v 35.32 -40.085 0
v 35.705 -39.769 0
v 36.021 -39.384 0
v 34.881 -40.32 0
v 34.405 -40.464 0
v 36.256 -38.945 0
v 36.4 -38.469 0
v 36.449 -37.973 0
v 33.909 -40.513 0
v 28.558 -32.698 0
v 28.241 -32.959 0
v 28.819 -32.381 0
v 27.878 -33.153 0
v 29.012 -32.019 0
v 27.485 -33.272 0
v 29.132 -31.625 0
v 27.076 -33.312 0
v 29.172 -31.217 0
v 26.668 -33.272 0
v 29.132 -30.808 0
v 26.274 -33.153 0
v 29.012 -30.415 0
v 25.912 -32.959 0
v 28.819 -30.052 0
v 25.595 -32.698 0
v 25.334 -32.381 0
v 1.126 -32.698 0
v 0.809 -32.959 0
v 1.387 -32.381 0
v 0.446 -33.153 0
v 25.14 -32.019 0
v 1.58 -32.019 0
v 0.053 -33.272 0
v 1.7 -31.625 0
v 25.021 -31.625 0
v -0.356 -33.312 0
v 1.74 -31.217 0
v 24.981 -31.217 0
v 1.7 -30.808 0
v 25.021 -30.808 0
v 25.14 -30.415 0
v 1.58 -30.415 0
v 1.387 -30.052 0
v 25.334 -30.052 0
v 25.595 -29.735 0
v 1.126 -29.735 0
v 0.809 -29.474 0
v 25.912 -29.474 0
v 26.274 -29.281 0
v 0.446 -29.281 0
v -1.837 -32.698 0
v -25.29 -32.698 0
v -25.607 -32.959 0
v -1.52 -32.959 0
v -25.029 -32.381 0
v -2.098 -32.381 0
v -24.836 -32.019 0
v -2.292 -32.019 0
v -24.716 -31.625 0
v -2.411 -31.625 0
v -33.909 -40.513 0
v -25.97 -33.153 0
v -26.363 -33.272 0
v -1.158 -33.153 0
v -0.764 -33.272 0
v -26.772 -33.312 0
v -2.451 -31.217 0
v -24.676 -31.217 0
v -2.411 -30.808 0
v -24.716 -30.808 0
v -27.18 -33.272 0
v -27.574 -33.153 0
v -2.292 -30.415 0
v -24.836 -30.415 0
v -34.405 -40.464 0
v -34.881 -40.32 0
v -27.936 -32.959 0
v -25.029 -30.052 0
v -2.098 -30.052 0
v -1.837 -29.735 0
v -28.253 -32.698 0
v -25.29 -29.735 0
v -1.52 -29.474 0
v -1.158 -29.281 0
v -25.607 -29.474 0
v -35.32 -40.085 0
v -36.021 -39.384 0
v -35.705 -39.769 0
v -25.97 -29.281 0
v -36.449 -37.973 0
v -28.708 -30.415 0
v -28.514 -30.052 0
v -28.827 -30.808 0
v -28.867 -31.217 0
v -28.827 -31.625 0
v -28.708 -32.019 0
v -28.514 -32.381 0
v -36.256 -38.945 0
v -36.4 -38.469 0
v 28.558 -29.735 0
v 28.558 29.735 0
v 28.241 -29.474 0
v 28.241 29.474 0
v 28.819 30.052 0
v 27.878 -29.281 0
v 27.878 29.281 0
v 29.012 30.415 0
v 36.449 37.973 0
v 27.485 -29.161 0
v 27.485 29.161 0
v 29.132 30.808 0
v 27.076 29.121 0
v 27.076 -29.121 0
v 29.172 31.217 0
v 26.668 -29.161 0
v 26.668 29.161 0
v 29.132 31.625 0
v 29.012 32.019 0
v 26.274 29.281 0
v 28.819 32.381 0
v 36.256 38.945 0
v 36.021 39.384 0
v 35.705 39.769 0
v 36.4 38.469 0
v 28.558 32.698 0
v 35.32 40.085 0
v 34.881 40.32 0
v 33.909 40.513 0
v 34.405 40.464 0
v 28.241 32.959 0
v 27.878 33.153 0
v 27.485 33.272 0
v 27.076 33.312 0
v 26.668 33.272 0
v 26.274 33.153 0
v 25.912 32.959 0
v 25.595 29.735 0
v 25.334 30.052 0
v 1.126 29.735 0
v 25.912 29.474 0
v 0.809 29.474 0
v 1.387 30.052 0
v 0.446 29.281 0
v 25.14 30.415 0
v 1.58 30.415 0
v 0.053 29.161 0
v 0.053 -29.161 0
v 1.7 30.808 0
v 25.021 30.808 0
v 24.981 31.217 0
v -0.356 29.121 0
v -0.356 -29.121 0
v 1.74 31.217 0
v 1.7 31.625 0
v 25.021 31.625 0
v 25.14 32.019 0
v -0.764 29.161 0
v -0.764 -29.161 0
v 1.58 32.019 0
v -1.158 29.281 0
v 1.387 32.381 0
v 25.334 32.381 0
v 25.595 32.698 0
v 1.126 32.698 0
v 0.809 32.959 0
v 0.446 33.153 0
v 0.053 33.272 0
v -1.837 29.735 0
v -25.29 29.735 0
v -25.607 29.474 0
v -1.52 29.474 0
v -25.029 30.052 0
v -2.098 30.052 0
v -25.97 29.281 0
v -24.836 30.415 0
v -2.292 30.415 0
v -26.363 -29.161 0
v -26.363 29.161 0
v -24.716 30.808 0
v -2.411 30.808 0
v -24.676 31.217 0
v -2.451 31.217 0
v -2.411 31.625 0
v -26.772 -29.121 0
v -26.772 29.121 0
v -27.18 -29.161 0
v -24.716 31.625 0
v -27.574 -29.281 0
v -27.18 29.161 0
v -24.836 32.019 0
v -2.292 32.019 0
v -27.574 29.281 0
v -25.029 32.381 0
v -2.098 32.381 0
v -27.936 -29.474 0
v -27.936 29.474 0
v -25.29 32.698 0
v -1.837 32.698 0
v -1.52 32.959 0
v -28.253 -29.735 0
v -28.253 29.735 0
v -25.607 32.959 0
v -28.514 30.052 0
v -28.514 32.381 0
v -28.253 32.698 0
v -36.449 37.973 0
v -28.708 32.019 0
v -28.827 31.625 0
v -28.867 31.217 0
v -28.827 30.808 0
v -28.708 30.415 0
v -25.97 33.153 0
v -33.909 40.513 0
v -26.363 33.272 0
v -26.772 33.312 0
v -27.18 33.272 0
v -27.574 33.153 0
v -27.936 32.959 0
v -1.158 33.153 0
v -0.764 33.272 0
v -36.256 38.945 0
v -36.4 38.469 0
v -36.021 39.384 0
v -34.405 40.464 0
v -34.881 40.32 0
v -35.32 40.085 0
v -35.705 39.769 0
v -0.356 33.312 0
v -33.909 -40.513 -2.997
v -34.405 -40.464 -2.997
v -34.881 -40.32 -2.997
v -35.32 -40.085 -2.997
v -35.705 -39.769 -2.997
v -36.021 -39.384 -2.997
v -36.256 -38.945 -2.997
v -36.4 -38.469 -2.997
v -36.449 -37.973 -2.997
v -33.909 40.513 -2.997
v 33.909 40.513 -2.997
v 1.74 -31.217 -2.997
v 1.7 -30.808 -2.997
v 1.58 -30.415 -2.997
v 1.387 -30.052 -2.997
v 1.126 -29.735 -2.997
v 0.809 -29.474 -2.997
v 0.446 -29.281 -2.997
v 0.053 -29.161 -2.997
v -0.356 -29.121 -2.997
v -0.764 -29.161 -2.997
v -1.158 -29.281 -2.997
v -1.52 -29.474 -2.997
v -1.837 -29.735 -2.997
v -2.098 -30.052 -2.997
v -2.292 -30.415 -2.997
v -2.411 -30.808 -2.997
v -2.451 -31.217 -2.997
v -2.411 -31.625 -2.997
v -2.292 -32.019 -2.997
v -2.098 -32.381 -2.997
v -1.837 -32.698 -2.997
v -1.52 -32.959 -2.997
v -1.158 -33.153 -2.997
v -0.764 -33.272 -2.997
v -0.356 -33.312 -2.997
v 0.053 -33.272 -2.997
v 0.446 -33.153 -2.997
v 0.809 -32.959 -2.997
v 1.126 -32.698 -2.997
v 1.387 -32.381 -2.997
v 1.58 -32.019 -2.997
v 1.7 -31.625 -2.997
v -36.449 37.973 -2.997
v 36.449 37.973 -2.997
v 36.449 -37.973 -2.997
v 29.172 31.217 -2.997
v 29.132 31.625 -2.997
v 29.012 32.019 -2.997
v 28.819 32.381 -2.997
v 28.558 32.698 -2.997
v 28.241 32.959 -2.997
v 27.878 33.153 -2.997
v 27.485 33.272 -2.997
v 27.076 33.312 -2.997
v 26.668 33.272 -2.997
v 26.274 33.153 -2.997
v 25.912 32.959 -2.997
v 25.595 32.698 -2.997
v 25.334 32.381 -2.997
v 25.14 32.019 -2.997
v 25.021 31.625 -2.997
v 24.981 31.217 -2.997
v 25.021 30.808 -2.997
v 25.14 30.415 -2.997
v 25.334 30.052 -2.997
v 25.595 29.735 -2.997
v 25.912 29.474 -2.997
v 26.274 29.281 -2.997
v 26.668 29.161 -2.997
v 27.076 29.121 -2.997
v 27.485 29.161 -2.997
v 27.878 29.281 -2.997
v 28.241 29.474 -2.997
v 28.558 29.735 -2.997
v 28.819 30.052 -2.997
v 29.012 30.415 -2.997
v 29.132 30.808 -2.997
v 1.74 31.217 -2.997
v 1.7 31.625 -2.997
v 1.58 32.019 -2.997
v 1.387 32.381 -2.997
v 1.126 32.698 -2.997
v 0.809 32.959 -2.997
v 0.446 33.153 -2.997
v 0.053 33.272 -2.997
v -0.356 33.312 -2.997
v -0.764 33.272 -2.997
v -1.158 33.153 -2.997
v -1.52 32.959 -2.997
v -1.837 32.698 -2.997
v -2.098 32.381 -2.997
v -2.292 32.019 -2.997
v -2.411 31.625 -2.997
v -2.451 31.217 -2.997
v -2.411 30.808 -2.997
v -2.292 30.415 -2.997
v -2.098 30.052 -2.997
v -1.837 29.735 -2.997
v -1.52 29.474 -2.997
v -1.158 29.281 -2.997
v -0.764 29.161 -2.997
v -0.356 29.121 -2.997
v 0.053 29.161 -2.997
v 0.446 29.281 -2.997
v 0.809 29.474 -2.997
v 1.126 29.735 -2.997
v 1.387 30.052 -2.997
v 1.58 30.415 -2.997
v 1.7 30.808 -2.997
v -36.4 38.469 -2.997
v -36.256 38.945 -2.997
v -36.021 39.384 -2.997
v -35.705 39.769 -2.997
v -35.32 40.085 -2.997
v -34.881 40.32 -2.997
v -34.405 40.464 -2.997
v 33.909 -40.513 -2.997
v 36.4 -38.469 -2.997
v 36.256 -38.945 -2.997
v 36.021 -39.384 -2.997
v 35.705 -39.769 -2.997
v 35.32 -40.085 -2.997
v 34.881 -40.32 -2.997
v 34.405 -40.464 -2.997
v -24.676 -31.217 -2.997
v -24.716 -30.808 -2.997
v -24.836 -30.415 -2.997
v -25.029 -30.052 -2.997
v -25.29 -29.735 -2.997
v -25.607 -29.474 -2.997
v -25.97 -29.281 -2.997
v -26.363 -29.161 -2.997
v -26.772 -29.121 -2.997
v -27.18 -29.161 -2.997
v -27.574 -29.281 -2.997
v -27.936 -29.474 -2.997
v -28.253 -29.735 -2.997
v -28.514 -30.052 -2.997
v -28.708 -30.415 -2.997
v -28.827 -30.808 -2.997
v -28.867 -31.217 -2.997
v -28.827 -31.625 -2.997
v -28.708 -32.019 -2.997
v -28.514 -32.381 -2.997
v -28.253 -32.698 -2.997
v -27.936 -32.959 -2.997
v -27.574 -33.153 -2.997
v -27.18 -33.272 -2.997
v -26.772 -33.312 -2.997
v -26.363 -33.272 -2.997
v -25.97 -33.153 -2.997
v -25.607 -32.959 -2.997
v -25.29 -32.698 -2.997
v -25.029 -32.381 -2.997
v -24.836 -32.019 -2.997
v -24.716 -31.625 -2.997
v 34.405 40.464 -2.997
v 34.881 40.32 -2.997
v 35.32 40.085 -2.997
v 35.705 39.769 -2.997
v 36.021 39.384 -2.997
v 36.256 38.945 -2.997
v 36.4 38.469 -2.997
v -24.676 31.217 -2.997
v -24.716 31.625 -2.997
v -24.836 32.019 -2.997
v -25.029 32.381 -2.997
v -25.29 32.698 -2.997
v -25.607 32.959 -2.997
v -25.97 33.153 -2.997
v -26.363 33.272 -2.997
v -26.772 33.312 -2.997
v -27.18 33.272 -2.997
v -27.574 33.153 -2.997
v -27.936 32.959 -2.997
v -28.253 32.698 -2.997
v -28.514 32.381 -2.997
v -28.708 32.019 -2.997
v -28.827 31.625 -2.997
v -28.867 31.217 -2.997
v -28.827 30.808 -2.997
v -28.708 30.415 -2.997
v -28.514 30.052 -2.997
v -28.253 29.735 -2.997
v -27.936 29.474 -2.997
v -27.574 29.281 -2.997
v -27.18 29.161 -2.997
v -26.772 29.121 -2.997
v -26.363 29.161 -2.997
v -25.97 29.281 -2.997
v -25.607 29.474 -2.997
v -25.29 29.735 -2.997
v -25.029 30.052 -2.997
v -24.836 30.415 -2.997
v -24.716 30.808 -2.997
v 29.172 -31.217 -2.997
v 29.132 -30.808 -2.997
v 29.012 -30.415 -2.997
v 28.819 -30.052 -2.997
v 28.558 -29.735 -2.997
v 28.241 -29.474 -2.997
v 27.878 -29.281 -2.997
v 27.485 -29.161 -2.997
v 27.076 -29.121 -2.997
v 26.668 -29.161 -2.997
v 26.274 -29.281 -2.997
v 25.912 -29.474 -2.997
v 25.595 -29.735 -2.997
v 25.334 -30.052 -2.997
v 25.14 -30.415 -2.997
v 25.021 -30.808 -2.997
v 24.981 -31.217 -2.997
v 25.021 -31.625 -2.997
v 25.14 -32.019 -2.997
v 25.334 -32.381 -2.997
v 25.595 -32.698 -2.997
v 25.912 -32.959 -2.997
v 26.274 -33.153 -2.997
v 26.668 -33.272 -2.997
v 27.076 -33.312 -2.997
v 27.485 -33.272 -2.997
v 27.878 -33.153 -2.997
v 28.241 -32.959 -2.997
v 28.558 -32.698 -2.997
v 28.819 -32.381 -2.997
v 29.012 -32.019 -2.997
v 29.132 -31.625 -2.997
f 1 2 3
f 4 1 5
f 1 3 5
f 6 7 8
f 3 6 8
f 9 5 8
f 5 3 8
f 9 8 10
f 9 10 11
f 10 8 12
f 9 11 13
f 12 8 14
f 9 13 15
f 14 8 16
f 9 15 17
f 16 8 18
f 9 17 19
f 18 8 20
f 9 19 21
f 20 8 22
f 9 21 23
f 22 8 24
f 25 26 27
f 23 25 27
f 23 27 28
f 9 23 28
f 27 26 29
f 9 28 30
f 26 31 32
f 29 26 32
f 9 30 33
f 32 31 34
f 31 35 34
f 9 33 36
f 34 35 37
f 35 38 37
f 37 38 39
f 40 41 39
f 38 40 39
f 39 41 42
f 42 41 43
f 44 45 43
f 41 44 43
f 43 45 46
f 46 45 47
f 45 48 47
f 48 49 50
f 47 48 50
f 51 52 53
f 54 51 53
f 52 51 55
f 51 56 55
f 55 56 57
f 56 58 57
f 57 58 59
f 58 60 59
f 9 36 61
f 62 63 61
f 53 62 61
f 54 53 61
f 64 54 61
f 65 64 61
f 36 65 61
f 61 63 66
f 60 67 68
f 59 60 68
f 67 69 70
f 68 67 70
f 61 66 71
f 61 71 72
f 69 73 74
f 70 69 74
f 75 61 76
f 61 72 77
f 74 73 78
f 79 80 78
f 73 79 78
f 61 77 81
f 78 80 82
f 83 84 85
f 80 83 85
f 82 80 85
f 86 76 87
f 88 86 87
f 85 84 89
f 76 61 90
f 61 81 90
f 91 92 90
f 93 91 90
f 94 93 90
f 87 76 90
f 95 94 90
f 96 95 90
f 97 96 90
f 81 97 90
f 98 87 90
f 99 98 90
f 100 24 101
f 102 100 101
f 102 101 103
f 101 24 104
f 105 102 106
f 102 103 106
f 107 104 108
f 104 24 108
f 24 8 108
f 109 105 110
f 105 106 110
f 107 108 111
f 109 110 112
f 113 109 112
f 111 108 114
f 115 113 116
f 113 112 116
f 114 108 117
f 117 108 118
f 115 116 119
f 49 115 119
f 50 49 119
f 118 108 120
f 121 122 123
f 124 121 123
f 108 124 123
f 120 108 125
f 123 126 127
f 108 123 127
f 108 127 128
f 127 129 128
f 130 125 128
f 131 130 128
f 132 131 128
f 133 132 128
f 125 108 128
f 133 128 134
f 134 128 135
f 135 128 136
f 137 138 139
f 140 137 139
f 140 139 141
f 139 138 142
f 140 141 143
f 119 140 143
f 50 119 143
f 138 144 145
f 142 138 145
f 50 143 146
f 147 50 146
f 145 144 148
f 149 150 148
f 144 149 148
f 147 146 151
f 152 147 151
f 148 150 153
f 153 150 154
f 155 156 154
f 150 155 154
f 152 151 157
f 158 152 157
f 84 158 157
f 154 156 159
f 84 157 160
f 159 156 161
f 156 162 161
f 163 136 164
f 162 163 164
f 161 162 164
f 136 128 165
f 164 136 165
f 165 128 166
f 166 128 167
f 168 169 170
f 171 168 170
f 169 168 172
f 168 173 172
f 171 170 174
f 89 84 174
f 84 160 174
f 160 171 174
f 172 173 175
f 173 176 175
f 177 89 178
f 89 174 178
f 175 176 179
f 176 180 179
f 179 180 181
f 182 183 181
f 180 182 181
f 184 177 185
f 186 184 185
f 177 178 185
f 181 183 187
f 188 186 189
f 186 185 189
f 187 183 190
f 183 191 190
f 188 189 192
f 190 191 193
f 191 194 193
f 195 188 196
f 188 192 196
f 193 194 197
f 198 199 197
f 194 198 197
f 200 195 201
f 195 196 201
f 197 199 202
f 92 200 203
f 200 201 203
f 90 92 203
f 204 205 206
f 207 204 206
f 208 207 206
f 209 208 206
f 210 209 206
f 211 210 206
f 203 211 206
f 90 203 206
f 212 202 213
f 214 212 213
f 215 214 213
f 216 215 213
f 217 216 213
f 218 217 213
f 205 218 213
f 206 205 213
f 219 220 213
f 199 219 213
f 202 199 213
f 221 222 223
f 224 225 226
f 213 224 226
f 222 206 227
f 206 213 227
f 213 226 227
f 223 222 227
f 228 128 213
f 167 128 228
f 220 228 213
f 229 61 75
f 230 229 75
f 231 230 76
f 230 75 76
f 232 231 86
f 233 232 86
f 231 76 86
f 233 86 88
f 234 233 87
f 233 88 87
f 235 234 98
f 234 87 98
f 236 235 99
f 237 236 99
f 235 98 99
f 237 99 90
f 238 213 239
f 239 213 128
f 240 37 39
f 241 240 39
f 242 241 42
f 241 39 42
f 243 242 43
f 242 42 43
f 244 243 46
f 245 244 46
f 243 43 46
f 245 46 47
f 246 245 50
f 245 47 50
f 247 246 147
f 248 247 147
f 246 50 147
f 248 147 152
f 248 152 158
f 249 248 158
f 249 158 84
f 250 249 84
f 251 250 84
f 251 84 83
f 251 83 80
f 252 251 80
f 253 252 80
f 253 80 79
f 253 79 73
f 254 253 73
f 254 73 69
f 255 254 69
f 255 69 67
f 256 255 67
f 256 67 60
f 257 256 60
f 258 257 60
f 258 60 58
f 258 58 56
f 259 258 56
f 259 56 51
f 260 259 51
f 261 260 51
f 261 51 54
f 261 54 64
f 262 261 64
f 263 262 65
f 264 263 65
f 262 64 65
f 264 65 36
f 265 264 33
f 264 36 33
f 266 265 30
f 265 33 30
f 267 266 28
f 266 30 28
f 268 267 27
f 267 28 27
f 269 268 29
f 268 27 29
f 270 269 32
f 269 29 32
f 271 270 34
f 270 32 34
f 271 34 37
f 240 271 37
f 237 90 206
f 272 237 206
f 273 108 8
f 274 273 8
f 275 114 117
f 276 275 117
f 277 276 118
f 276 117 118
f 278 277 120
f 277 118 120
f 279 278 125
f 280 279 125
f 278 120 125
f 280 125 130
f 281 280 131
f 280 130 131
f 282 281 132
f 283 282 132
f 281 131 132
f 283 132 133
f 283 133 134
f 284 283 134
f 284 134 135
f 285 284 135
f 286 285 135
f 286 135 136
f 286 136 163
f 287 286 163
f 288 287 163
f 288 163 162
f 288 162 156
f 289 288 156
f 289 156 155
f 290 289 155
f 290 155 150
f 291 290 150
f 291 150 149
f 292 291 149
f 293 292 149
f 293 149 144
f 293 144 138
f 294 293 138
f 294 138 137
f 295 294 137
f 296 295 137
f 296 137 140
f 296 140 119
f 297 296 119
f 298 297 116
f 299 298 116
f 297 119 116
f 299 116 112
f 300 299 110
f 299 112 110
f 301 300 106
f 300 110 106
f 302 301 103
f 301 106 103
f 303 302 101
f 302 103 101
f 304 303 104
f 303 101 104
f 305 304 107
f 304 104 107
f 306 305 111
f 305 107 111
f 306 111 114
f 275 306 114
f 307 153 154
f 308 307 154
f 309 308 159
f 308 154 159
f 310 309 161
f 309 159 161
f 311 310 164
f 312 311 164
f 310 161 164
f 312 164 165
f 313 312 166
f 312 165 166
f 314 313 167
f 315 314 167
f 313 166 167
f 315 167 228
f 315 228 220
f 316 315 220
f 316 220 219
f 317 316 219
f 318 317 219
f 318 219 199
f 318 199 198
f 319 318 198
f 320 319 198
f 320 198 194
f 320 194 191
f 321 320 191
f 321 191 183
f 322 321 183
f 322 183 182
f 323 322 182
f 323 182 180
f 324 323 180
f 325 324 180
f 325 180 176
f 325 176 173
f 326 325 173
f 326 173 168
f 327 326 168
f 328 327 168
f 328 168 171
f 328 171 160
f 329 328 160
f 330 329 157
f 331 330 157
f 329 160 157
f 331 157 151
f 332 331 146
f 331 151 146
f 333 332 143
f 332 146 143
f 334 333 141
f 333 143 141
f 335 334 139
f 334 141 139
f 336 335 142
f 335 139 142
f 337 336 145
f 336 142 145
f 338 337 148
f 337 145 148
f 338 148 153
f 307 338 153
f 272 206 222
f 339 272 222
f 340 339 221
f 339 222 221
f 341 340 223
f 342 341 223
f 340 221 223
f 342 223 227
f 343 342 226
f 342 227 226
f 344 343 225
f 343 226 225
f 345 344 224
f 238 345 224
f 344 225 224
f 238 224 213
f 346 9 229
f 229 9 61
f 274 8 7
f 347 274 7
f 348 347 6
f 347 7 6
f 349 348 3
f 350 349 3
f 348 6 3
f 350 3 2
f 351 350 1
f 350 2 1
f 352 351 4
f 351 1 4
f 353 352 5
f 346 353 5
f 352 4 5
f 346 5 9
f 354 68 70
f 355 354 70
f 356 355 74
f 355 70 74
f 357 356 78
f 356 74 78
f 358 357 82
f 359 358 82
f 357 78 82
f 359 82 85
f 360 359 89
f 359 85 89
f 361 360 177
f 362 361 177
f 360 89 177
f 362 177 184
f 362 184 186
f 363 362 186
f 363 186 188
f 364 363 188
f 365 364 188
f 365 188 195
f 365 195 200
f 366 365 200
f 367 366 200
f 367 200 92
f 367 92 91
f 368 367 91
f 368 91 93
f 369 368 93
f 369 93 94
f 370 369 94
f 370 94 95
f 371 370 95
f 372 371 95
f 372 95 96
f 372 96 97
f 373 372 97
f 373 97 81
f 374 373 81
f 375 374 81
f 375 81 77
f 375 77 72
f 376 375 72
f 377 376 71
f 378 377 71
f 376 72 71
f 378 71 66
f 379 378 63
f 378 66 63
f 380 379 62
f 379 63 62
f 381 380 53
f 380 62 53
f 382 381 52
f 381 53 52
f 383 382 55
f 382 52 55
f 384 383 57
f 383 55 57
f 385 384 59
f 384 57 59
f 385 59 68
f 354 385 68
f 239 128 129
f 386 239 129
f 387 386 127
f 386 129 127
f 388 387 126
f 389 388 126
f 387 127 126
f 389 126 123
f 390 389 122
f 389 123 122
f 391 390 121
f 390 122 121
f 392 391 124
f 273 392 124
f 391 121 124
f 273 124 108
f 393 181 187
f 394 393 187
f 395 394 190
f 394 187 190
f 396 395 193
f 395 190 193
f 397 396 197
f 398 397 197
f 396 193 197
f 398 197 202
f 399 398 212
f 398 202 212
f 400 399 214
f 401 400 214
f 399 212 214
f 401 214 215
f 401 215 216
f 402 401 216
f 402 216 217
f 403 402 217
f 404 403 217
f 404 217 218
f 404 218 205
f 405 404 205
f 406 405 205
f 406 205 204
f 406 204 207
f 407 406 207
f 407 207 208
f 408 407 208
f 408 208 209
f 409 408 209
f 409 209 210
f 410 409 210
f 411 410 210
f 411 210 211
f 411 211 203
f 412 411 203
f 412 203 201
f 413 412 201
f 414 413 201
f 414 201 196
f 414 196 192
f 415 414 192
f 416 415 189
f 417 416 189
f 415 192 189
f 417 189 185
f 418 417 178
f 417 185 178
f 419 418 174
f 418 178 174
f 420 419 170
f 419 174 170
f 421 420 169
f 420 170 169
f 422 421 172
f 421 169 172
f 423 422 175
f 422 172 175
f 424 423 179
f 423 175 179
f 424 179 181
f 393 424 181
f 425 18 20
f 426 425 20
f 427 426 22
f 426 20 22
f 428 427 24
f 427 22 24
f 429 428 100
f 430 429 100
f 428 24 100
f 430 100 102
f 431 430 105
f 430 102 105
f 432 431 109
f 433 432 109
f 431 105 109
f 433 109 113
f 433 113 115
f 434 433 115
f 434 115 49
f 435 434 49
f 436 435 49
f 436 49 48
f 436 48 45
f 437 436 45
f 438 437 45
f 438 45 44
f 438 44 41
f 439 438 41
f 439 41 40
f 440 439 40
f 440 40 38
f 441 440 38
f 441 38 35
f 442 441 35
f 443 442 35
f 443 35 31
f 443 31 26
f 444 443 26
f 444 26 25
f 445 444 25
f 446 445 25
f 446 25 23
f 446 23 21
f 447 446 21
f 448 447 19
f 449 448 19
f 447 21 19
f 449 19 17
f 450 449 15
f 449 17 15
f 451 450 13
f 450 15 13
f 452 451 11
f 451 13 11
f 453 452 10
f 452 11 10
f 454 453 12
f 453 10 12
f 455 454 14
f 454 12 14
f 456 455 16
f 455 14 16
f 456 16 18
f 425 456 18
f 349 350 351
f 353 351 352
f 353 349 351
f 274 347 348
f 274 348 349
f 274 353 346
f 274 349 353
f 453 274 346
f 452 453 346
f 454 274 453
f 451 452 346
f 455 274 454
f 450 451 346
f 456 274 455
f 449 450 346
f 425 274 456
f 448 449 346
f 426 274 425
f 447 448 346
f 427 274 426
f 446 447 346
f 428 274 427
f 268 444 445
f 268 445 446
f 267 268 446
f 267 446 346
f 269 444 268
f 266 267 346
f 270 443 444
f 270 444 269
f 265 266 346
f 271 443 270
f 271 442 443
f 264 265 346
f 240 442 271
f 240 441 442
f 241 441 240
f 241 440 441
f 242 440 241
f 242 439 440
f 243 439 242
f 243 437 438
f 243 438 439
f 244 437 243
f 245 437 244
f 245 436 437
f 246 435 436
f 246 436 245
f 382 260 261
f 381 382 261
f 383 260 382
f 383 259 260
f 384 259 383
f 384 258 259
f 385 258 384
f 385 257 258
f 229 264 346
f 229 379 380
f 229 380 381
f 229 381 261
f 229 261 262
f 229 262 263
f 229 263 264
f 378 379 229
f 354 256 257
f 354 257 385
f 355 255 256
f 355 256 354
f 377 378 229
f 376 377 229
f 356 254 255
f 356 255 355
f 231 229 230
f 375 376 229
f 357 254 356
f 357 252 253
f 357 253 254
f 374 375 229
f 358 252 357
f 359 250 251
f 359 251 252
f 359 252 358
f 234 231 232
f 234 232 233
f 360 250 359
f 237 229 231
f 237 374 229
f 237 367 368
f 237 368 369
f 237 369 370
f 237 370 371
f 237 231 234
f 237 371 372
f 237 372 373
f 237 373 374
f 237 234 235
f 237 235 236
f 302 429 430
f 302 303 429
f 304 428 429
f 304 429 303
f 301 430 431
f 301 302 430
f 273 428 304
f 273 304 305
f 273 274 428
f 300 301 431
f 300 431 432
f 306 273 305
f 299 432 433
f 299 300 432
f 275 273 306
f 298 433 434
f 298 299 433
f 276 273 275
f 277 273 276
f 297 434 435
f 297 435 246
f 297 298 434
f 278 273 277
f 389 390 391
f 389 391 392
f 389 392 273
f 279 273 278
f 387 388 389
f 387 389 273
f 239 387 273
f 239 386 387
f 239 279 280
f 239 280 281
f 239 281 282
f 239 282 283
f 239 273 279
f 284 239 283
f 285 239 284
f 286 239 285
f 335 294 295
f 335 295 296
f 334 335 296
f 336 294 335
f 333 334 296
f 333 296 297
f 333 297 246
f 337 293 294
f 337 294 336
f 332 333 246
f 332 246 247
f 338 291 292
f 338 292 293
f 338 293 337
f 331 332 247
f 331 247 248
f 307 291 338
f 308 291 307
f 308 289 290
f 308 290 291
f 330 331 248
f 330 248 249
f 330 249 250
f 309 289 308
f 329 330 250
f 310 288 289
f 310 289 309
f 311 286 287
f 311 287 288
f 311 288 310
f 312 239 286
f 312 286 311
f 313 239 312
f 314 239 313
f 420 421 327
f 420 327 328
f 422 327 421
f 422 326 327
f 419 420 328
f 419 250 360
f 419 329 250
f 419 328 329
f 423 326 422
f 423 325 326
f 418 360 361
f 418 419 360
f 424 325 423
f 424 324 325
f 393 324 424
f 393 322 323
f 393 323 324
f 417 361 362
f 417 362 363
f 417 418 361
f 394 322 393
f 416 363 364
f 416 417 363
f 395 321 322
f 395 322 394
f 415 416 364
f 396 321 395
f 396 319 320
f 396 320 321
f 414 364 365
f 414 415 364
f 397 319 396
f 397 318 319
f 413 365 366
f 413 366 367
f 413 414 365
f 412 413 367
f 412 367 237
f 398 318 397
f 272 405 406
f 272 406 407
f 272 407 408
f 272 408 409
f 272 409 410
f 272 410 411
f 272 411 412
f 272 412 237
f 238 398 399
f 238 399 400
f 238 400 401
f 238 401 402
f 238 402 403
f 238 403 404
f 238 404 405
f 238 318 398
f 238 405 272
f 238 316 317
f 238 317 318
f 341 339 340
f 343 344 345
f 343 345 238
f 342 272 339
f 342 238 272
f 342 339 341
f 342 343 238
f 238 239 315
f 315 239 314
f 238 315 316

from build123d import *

# Parameters (mm, degrees)
BOSS_EXTRUDE1_DEPTH = 2.9972
SKETCH3_R           = 2.0955
CUT_EXTRUDE1_DEPTH  = 55.578530374


with BuildPart() as part:
    # Sketch2 → Boss-Extrude1 (new body)
    with BuildSketch(Plane.XY):
        with BuildLine():
            Line((-36.449, -37.973), (-36.449, 37.973))
            ThreePointArc((-36.449, 37.973), (-35.705051224, 39.769051224), (-33.909, 40.513))
            Line((-33.909, 40.513), (33.909, 40.513))
            ThreePointArc((33.909, 40.513), (35.705051224, 39.769051224), (36.449, 37.973))
            Line((36.449, 37.973), (36.449, -37.973))
            ThreePointArc((36.449, -37.973), (35.705051224, -39.769051224), (33.909, -40.513))
            Line((33.909, -40.513), (-33.909, -40.513))
            ThreePointArc((-33.909, -40.513), (-35.705051224, -39.769051224), (-36.449, -37.973))
        make_face()
    extrude(amount=-BOSS_EXTRUDE1_DEPTH)

    # Sketch3 → Cut-Extrude1 (cut, through all)
    with BuildSketch(Plane.XY):
        with Locations((-26.7716, 31.2166)):
            Circle(SKETCH3_R)
        with Locations((-0.3556, 31.2166)):
            Circle(SKETCH3_R)
        with Locations((27.0764, 31.2166)):
            Circle(SKETCH3_R)
        with Locations((27.0764, -31.2166)):
            Circle(SKETCH3_R)
        with Locations((-0.3556, -31.2166)):
            Circle(SKETCH3_R)
        with Locations((-26.7716, -31.2166)):
            Circle(SKETCH3_R)
    extrude(amount=-CUT_EXTRUDE1_DEPTH, mode=Mode.SUBTRACT)


solid = part.part
